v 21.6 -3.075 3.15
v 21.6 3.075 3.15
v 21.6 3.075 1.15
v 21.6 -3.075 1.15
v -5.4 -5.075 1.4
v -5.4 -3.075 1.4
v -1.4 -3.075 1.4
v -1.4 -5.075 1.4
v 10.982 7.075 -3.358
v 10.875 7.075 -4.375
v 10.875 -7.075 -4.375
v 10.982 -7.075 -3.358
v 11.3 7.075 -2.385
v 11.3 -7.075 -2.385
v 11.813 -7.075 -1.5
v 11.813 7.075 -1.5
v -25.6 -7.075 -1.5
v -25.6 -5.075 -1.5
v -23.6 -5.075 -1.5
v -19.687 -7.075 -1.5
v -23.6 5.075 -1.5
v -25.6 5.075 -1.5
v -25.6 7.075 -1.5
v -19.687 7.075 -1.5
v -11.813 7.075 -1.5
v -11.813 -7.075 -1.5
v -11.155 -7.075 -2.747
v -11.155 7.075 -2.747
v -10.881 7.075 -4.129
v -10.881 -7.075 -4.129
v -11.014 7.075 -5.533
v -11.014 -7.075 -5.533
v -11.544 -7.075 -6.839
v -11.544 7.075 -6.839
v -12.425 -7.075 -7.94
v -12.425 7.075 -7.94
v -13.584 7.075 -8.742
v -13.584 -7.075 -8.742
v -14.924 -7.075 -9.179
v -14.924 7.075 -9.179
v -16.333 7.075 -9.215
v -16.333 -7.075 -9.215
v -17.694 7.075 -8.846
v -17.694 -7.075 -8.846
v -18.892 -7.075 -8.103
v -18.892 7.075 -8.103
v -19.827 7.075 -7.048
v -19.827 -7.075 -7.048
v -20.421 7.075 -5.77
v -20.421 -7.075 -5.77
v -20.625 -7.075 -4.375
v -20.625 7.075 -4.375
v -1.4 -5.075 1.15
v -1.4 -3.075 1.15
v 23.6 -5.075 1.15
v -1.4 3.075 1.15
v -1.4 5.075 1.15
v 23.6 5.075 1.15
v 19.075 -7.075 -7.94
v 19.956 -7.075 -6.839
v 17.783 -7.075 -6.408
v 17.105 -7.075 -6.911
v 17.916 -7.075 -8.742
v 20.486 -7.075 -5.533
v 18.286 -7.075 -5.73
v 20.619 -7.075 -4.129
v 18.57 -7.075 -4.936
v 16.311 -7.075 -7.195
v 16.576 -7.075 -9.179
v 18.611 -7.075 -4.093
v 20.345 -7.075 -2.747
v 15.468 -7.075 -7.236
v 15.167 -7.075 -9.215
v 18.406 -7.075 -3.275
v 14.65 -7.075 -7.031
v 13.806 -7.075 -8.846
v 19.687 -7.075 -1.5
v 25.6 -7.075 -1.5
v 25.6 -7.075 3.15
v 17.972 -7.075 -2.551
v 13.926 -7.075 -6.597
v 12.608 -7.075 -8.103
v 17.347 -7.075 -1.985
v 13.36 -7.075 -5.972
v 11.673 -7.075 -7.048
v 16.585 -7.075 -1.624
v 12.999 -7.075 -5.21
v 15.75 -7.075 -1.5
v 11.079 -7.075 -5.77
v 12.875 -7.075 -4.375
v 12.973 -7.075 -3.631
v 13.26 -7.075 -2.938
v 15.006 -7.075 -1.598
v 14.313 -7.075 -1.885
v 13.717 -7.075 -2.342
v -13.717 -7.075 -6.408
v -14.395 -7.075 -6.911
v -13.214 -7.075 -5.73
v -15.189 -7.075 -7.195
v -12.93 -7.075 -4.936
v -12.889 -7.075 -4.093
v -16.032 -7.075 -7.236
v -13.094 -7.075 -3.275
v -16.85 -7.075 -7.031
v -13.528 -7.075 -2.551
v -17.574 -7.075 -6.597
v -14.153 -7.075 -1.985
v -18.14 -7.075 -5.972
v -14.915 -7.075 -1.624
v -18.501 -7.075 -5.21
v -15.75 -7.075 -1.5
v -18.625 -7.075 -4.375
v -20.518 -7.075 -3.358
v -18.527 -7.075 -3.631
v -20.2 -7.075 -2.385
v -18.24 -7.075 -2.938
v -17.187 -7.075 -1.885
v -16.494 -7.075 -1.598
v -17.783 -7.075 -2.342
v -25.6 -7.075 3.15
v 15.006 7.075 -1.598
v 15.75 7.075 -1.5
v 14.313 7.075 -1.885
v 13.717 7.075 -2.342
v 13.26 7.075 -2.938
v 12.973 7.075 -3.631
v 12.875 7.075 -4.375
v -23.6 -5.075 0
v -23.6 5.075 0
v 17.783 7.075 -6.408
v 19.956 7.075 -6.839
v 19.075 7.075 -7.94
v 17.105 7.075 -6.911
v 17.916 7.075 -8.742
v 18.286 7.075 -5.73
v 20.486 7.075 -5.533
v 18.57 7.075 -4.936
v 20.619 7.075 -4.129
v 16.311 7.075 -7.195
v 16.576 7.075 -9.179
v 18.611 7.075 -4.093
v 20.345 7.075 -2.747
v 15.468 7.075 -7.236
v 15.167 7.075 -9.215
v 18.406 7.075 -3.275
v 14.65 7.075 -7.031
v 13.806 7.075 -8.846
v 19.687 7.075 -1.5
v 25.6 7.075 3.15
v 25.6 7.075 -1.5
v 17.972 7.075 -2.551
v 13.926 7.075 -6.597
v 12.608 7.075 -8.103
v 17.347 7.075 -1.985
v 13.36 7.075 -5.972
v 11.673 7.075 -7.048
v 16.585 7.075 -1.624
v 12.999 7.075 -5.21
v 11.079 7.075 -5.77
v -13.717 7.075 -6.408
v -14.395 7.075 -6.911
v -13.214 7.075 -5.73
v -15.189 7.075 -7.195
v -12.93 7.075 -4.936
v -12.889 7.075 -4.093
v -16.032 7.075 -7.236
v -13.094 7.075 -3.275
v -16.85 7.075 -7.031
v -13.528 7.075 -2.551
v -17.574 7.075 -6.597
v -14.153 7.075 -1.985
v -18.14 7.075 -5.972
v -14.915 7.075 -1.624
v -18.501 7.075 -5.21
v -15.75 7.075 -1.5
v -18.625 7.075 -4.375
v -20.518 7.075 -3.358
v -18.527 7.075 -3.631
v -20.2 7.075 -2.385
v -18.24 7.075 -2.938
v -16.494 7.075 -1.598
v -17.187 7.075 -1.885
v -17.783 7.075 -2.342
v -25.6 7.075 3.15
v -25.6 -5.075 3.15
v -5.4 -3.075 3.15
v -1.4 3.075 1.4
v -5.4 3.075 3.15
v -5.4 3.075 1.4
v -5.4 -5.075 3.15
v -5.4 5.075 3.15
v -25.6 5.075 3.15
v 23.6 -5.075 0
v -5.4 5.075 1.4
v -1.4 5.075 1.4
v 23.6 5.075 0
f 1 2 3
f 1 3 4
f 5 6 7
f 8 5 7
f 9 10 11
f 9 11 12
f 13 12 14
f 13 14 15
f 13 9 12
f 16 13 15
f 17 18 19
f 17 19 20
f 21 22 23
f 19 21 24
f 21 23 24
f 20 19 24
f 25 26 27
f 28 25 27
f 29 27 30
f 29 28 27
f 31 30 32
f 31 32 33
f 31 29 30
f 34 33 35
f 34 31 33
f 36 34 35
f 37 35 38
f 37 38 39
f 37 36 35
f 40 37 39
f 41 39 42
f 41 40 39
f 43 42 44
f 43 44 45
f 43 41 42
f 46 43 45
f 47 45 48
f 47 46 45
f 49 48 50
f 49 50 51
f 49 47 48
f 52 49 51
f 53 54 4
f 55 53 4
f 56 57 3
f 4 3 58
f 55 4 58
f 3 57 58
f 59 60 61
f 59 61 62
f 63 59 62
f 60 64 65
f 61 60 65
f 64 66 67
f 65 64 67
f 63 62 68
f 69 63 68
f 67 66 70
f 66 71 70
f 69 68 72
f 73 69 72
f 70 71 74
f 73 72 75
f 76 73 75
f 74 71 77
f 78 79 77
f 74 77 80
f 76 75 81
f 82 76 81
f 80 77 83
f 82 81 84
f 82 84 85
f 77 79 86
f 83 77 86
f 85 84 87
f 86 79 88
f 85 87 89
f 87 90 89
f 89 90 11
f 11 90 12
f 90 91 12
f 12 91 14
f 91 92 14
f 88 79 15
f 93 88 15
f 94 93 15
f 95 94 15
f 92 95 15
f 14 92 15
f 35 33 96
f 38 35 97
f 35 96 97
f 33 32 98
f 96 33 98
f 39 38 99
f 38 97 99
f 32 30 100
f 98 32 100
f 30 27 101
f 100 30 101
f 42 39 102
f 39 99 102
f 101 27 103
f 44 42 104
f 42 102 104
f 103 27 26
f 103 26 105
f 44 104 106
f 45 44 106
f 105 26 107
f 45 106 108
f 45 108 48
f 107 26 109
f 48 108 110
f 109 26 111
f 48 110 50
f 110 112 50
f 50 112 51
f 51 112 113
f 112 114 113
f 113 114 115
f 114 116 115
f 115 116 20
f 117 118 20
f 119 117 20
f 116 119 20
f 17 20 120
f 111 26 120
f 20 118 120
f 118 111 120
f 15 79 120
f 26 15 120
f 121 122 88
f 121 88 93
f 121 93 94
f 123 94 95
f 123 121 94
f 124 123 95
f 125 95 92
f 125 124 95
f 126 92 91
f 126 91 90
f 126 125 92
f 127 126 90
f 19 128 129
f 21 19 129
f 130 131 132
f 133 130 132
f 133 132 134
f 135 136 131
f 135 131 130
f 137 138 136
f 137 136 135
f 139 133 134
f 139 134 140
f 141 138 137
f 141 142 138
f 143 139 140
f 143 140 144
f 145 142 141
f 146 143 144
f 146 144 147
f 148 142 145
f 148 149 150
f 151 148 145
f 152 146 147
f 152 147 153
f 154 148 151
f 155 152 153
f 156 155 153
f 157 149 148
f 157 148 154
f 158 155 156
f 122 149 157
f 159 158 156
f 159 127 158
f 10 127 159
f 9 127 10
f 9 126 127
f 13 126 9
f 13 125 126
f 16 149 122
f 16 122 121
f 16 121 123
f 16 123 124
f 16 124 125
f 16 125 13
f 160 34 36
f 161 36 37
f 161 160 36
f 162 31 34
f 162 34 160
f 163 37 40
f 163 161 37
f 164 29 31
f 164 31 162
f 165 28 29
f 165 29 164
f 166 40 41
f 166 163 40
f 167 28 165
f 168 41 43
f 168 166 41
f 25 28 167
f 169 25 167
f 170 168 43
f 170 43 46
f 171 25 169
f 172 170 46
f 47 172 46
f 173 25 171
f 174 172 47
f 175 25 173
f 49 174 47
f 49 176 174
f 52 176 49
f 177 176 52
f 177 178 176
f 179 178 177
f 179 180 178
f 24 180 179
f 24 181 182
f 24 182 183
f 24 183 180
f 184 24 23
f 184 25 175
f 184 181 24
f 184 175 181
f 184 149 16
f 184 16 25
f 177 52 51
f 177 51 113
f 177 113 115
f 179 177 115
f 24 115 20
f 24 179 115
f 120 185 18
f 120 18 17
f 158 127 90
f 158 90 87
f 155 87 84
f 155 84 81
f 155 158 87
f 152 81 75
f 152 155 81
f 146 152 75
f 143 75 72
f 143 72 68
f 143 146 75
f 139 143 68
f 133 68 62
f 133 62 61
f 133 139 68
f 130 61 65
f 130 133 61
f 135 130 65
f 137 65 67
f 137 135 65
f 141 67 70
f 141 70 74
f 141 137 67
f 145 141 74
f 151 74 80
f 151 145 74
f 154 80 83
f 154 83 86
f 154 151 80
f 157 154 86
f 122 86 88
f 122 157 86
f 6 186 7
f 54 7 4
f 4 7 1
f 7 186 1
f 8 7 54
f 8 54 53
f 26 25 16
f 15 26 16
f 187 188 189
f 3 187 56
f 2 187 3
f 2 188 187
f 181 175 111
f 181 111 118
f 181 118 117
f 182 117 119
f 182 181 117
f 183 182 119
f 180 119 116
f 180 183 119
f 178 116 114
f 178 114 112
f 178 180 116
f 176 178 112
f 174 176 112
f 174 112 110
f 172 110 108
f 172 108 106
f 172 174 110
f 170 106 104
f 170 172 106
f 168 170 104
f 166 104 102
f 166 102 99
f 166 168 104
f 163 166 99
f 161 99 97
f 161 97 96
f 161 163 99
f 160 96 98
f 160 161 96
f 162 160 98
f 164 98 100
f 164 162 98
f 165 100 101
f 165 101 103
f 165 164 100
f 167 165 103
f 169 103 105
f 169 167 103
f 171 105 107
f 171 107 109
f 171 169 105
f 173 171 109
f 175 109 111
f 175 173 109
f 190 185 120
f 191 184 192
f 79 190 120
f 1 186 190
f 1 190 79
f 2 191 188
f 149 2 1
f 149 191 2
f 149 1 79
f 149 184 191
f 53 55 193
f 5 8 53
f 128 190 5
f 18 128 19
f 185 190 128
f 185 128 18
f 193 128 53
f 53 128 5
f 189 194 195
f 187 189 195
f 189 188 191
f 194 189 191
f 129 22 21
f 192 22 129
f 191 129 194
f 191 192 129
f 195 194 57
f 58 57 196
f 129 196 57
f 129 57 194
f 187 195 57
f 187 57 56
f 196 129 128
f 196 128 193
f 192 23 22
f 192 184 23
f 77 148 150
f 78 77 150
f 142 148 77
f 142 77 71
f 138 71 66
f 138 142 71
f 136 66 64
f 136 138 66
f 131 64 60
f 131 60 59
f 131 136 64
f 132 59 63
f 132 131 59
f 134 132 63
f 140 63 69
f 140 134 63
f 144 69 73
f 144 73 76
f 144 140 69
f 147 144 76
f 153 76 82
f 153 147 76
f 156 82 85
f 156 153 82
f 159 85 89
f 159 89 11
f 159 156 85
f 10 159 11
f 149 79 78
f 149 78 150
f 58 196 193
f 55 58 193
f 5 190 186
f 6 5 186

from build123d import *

# Parameters (mm, degrees)
F1_DEPTH = 3.15
F0_W     = 47.2
F0_H     = 10.15
F3_DEPTH = 1.5
F4_DEPTH = 2
F2_W     = 4
F2_H     = 2
F5_DEPTH = 1.75
F7_DEPTH = 14.15


with BuildPart() as f1:
    # F0 (on Top) → F1 (new body)
    with BuildSketch(Plane.XY):
        Polygon((23.6, 5.075), (23.6, -5.075), (-23.6, -5.075), (-25.6, -5.075), (-25.6, -7.075), (25.6, -7.075), (25.6, 7.075), (-25.6, 7.075), (-25.6, 5.075), (-23.6, 5.075), align=None)
    extrude(amount=F1_DEPTH)

    # F0 (on Top) → F3 (join)
    with BuildSketch(Plane.XY):
        Rectangle(F0_W, F0_H)
        Polygon((23.6, 5.075), (23.6, -5.075), (-23.6, -5.075), (-25.6, -5.075), (-25.6, -7.075), (25.6, -7.075), (25.6, 7.075), (-25.6, 7.075), (-25.6, 5.075), (-23.6, 5.075), align=None)
    extrude(amount=-F3_DEPTH)

    # F2 (on face) → F4 (join)
    with BuildSketch(Plane.XY.offset(3.15)):
        Polygon((23.6, -5.075), (23.6, -3.075), (21.6, -3.075), (-1.4, -3.075), (-1.4, -5.075), align=None)
        Polygon((23.6, 5.075), (-1.4, 5.075), (-1.4, 3.075), (21.6, 3.075), (21.6, -3.075), (23.6, -3.075), align=None)
    extrude(amount=-F4_DEPTH)

    # F2 (on face) → F5 (join)
    with BuildSketch(Plane.XY.offset(3.15)):
        with Locations((-3.4, -4.075)):
            Rectangle(F2_W, F2_H)
        with Locations((-3.4, 4.075)):
            Rectangle(F2_W, F2_H)
    extrude(amount=-F5_DEPTH)

    # F6 (on face) → F7 (join)
    with BuildSketch(Plane(origin=(0, 7.075, 0), x_dir=(-1, 0, 0), z_dir=(0, 1, 0))):
        with BuildLine():
            Line((12.0083426132, -1.5), (11.812996063, -1.5))
            ThreePointArc((11.812996063, -1.5), (14.2379267863, -9.0095722129), (20.625, -4.375))
            ThreePointArc((20.625, -4.375), (20.3845722129, -2.8629267863), (19.687003937, -1.5))
            Line((19.687003937, -1.5), (19.4916573868, -1.5))
            Line((19.4916573868, -1.5), (18.25, -1.5))
            Line((18.25, -1.5), (15.75, -1.5))
            Line((15.75, -1.5), (12.0083426132, -1.5))
        make_face()
        with BuildLine():
            ThreePointArc((18.625, -4.375), (13.7170680041, -6.4079319959), (15.75, -1.5))
            ThreePointArc((15.75, -1.5), (17.7829319959, -2.3420680041), (18.625, -4.375))
        make_face(mode=Mode.SUBTRACT)
        with BuildLine():
            ThreePointArc((13.5994186832, 0), (12.615167699, -0.6415764445), (11.812996063, -1.5))
            Line((11.812996063, -1.5), (12.0083426132, -1.5))
            Line((12.0083426132, -1.5), (15.75, -1.5))
            Line((15.75, -1.5), (18.25, -1.5))
            Line((18.25, -1.5), (19.4916573868, -1.5))
            Line((19.4916573868, -1.5), (19.687003937, -1.5))
            ThreePointArc((19.687003937, -1.5), (18.884832301, -0.6415764445), (17.9005813168, 0))
            Line((17.9005813168, 0), (17.8115528128, 0))
            Line((17.8115528128, 0), (13.6884471872, 0))
            Line((13.6884471872, 0), (13.5994186832, 0))
        make_face()
        with BuildLine():
            Line((-19.4916573868, -1.5), (-18.25, -1.5))
            Line((-18.25, -1.5), (-15.75, -1.5))
            Line((-15.75, -1.5), (-12.0083426132, -1.5))
            Line((-12.0083426132, -1.5), (-11.812996063, -1.5))
            ThreePointArc((-11.812996063, -1.5), (-12.615167699, -0.6415764445), (-13.5994186832, 0))
            Line((-13.5994186832, 0), (-13.6884471872, 0))
            Line((-13.6884471872, 0), (-17.8115528128, 0))
            Line((-17.8115528128, 0), (-17.9005813168, 0))
            ThreePointArc((-17.9005813168, 0), (-18.884832301, -0.6415764445), (-19.687003937, -1.5))
            Line((-19.687003937, -1.5), (-19.4916573868, -1.5))
        make_face()
        with BuildLine():
            Line((-15.75, -1.5), (-18.25, -1.5))
            Line((-18.25, -1.5), (-19.4916573868, -1.5))
            Line((-19.4916573868, -1.5), (-19.687003937, -1.5))
            ThreePointArc((-19.687003937, -1.5), (-17.2620732137, -9.0095722129), (-10.875, -4.375))
            ThreePointArc((-10.875, -4.375), (-11.1154277871, -2.8629267863), (-11.812996063, -1.5))
            Line((-11.812996063, -1.5), (-12.0083426132, -1.5))
            Line((-12.0083426132, -1.5), (-15.75, -1.5))
        make_face()
        with BuildLine():
            ThreePointArc((-12.875, -4.375), (-17.7829319959, -6.4079319959), (-15.75, -1.5))
            ThreePointArc((-15.75, -1.5), (-13.7170680041, -2.3420680041), (-12.875, -4.375))
        make_face(mode=Mode.SUBTRACT)
    extrude(amount=-F7_DEPTH)


solid = f1.part
